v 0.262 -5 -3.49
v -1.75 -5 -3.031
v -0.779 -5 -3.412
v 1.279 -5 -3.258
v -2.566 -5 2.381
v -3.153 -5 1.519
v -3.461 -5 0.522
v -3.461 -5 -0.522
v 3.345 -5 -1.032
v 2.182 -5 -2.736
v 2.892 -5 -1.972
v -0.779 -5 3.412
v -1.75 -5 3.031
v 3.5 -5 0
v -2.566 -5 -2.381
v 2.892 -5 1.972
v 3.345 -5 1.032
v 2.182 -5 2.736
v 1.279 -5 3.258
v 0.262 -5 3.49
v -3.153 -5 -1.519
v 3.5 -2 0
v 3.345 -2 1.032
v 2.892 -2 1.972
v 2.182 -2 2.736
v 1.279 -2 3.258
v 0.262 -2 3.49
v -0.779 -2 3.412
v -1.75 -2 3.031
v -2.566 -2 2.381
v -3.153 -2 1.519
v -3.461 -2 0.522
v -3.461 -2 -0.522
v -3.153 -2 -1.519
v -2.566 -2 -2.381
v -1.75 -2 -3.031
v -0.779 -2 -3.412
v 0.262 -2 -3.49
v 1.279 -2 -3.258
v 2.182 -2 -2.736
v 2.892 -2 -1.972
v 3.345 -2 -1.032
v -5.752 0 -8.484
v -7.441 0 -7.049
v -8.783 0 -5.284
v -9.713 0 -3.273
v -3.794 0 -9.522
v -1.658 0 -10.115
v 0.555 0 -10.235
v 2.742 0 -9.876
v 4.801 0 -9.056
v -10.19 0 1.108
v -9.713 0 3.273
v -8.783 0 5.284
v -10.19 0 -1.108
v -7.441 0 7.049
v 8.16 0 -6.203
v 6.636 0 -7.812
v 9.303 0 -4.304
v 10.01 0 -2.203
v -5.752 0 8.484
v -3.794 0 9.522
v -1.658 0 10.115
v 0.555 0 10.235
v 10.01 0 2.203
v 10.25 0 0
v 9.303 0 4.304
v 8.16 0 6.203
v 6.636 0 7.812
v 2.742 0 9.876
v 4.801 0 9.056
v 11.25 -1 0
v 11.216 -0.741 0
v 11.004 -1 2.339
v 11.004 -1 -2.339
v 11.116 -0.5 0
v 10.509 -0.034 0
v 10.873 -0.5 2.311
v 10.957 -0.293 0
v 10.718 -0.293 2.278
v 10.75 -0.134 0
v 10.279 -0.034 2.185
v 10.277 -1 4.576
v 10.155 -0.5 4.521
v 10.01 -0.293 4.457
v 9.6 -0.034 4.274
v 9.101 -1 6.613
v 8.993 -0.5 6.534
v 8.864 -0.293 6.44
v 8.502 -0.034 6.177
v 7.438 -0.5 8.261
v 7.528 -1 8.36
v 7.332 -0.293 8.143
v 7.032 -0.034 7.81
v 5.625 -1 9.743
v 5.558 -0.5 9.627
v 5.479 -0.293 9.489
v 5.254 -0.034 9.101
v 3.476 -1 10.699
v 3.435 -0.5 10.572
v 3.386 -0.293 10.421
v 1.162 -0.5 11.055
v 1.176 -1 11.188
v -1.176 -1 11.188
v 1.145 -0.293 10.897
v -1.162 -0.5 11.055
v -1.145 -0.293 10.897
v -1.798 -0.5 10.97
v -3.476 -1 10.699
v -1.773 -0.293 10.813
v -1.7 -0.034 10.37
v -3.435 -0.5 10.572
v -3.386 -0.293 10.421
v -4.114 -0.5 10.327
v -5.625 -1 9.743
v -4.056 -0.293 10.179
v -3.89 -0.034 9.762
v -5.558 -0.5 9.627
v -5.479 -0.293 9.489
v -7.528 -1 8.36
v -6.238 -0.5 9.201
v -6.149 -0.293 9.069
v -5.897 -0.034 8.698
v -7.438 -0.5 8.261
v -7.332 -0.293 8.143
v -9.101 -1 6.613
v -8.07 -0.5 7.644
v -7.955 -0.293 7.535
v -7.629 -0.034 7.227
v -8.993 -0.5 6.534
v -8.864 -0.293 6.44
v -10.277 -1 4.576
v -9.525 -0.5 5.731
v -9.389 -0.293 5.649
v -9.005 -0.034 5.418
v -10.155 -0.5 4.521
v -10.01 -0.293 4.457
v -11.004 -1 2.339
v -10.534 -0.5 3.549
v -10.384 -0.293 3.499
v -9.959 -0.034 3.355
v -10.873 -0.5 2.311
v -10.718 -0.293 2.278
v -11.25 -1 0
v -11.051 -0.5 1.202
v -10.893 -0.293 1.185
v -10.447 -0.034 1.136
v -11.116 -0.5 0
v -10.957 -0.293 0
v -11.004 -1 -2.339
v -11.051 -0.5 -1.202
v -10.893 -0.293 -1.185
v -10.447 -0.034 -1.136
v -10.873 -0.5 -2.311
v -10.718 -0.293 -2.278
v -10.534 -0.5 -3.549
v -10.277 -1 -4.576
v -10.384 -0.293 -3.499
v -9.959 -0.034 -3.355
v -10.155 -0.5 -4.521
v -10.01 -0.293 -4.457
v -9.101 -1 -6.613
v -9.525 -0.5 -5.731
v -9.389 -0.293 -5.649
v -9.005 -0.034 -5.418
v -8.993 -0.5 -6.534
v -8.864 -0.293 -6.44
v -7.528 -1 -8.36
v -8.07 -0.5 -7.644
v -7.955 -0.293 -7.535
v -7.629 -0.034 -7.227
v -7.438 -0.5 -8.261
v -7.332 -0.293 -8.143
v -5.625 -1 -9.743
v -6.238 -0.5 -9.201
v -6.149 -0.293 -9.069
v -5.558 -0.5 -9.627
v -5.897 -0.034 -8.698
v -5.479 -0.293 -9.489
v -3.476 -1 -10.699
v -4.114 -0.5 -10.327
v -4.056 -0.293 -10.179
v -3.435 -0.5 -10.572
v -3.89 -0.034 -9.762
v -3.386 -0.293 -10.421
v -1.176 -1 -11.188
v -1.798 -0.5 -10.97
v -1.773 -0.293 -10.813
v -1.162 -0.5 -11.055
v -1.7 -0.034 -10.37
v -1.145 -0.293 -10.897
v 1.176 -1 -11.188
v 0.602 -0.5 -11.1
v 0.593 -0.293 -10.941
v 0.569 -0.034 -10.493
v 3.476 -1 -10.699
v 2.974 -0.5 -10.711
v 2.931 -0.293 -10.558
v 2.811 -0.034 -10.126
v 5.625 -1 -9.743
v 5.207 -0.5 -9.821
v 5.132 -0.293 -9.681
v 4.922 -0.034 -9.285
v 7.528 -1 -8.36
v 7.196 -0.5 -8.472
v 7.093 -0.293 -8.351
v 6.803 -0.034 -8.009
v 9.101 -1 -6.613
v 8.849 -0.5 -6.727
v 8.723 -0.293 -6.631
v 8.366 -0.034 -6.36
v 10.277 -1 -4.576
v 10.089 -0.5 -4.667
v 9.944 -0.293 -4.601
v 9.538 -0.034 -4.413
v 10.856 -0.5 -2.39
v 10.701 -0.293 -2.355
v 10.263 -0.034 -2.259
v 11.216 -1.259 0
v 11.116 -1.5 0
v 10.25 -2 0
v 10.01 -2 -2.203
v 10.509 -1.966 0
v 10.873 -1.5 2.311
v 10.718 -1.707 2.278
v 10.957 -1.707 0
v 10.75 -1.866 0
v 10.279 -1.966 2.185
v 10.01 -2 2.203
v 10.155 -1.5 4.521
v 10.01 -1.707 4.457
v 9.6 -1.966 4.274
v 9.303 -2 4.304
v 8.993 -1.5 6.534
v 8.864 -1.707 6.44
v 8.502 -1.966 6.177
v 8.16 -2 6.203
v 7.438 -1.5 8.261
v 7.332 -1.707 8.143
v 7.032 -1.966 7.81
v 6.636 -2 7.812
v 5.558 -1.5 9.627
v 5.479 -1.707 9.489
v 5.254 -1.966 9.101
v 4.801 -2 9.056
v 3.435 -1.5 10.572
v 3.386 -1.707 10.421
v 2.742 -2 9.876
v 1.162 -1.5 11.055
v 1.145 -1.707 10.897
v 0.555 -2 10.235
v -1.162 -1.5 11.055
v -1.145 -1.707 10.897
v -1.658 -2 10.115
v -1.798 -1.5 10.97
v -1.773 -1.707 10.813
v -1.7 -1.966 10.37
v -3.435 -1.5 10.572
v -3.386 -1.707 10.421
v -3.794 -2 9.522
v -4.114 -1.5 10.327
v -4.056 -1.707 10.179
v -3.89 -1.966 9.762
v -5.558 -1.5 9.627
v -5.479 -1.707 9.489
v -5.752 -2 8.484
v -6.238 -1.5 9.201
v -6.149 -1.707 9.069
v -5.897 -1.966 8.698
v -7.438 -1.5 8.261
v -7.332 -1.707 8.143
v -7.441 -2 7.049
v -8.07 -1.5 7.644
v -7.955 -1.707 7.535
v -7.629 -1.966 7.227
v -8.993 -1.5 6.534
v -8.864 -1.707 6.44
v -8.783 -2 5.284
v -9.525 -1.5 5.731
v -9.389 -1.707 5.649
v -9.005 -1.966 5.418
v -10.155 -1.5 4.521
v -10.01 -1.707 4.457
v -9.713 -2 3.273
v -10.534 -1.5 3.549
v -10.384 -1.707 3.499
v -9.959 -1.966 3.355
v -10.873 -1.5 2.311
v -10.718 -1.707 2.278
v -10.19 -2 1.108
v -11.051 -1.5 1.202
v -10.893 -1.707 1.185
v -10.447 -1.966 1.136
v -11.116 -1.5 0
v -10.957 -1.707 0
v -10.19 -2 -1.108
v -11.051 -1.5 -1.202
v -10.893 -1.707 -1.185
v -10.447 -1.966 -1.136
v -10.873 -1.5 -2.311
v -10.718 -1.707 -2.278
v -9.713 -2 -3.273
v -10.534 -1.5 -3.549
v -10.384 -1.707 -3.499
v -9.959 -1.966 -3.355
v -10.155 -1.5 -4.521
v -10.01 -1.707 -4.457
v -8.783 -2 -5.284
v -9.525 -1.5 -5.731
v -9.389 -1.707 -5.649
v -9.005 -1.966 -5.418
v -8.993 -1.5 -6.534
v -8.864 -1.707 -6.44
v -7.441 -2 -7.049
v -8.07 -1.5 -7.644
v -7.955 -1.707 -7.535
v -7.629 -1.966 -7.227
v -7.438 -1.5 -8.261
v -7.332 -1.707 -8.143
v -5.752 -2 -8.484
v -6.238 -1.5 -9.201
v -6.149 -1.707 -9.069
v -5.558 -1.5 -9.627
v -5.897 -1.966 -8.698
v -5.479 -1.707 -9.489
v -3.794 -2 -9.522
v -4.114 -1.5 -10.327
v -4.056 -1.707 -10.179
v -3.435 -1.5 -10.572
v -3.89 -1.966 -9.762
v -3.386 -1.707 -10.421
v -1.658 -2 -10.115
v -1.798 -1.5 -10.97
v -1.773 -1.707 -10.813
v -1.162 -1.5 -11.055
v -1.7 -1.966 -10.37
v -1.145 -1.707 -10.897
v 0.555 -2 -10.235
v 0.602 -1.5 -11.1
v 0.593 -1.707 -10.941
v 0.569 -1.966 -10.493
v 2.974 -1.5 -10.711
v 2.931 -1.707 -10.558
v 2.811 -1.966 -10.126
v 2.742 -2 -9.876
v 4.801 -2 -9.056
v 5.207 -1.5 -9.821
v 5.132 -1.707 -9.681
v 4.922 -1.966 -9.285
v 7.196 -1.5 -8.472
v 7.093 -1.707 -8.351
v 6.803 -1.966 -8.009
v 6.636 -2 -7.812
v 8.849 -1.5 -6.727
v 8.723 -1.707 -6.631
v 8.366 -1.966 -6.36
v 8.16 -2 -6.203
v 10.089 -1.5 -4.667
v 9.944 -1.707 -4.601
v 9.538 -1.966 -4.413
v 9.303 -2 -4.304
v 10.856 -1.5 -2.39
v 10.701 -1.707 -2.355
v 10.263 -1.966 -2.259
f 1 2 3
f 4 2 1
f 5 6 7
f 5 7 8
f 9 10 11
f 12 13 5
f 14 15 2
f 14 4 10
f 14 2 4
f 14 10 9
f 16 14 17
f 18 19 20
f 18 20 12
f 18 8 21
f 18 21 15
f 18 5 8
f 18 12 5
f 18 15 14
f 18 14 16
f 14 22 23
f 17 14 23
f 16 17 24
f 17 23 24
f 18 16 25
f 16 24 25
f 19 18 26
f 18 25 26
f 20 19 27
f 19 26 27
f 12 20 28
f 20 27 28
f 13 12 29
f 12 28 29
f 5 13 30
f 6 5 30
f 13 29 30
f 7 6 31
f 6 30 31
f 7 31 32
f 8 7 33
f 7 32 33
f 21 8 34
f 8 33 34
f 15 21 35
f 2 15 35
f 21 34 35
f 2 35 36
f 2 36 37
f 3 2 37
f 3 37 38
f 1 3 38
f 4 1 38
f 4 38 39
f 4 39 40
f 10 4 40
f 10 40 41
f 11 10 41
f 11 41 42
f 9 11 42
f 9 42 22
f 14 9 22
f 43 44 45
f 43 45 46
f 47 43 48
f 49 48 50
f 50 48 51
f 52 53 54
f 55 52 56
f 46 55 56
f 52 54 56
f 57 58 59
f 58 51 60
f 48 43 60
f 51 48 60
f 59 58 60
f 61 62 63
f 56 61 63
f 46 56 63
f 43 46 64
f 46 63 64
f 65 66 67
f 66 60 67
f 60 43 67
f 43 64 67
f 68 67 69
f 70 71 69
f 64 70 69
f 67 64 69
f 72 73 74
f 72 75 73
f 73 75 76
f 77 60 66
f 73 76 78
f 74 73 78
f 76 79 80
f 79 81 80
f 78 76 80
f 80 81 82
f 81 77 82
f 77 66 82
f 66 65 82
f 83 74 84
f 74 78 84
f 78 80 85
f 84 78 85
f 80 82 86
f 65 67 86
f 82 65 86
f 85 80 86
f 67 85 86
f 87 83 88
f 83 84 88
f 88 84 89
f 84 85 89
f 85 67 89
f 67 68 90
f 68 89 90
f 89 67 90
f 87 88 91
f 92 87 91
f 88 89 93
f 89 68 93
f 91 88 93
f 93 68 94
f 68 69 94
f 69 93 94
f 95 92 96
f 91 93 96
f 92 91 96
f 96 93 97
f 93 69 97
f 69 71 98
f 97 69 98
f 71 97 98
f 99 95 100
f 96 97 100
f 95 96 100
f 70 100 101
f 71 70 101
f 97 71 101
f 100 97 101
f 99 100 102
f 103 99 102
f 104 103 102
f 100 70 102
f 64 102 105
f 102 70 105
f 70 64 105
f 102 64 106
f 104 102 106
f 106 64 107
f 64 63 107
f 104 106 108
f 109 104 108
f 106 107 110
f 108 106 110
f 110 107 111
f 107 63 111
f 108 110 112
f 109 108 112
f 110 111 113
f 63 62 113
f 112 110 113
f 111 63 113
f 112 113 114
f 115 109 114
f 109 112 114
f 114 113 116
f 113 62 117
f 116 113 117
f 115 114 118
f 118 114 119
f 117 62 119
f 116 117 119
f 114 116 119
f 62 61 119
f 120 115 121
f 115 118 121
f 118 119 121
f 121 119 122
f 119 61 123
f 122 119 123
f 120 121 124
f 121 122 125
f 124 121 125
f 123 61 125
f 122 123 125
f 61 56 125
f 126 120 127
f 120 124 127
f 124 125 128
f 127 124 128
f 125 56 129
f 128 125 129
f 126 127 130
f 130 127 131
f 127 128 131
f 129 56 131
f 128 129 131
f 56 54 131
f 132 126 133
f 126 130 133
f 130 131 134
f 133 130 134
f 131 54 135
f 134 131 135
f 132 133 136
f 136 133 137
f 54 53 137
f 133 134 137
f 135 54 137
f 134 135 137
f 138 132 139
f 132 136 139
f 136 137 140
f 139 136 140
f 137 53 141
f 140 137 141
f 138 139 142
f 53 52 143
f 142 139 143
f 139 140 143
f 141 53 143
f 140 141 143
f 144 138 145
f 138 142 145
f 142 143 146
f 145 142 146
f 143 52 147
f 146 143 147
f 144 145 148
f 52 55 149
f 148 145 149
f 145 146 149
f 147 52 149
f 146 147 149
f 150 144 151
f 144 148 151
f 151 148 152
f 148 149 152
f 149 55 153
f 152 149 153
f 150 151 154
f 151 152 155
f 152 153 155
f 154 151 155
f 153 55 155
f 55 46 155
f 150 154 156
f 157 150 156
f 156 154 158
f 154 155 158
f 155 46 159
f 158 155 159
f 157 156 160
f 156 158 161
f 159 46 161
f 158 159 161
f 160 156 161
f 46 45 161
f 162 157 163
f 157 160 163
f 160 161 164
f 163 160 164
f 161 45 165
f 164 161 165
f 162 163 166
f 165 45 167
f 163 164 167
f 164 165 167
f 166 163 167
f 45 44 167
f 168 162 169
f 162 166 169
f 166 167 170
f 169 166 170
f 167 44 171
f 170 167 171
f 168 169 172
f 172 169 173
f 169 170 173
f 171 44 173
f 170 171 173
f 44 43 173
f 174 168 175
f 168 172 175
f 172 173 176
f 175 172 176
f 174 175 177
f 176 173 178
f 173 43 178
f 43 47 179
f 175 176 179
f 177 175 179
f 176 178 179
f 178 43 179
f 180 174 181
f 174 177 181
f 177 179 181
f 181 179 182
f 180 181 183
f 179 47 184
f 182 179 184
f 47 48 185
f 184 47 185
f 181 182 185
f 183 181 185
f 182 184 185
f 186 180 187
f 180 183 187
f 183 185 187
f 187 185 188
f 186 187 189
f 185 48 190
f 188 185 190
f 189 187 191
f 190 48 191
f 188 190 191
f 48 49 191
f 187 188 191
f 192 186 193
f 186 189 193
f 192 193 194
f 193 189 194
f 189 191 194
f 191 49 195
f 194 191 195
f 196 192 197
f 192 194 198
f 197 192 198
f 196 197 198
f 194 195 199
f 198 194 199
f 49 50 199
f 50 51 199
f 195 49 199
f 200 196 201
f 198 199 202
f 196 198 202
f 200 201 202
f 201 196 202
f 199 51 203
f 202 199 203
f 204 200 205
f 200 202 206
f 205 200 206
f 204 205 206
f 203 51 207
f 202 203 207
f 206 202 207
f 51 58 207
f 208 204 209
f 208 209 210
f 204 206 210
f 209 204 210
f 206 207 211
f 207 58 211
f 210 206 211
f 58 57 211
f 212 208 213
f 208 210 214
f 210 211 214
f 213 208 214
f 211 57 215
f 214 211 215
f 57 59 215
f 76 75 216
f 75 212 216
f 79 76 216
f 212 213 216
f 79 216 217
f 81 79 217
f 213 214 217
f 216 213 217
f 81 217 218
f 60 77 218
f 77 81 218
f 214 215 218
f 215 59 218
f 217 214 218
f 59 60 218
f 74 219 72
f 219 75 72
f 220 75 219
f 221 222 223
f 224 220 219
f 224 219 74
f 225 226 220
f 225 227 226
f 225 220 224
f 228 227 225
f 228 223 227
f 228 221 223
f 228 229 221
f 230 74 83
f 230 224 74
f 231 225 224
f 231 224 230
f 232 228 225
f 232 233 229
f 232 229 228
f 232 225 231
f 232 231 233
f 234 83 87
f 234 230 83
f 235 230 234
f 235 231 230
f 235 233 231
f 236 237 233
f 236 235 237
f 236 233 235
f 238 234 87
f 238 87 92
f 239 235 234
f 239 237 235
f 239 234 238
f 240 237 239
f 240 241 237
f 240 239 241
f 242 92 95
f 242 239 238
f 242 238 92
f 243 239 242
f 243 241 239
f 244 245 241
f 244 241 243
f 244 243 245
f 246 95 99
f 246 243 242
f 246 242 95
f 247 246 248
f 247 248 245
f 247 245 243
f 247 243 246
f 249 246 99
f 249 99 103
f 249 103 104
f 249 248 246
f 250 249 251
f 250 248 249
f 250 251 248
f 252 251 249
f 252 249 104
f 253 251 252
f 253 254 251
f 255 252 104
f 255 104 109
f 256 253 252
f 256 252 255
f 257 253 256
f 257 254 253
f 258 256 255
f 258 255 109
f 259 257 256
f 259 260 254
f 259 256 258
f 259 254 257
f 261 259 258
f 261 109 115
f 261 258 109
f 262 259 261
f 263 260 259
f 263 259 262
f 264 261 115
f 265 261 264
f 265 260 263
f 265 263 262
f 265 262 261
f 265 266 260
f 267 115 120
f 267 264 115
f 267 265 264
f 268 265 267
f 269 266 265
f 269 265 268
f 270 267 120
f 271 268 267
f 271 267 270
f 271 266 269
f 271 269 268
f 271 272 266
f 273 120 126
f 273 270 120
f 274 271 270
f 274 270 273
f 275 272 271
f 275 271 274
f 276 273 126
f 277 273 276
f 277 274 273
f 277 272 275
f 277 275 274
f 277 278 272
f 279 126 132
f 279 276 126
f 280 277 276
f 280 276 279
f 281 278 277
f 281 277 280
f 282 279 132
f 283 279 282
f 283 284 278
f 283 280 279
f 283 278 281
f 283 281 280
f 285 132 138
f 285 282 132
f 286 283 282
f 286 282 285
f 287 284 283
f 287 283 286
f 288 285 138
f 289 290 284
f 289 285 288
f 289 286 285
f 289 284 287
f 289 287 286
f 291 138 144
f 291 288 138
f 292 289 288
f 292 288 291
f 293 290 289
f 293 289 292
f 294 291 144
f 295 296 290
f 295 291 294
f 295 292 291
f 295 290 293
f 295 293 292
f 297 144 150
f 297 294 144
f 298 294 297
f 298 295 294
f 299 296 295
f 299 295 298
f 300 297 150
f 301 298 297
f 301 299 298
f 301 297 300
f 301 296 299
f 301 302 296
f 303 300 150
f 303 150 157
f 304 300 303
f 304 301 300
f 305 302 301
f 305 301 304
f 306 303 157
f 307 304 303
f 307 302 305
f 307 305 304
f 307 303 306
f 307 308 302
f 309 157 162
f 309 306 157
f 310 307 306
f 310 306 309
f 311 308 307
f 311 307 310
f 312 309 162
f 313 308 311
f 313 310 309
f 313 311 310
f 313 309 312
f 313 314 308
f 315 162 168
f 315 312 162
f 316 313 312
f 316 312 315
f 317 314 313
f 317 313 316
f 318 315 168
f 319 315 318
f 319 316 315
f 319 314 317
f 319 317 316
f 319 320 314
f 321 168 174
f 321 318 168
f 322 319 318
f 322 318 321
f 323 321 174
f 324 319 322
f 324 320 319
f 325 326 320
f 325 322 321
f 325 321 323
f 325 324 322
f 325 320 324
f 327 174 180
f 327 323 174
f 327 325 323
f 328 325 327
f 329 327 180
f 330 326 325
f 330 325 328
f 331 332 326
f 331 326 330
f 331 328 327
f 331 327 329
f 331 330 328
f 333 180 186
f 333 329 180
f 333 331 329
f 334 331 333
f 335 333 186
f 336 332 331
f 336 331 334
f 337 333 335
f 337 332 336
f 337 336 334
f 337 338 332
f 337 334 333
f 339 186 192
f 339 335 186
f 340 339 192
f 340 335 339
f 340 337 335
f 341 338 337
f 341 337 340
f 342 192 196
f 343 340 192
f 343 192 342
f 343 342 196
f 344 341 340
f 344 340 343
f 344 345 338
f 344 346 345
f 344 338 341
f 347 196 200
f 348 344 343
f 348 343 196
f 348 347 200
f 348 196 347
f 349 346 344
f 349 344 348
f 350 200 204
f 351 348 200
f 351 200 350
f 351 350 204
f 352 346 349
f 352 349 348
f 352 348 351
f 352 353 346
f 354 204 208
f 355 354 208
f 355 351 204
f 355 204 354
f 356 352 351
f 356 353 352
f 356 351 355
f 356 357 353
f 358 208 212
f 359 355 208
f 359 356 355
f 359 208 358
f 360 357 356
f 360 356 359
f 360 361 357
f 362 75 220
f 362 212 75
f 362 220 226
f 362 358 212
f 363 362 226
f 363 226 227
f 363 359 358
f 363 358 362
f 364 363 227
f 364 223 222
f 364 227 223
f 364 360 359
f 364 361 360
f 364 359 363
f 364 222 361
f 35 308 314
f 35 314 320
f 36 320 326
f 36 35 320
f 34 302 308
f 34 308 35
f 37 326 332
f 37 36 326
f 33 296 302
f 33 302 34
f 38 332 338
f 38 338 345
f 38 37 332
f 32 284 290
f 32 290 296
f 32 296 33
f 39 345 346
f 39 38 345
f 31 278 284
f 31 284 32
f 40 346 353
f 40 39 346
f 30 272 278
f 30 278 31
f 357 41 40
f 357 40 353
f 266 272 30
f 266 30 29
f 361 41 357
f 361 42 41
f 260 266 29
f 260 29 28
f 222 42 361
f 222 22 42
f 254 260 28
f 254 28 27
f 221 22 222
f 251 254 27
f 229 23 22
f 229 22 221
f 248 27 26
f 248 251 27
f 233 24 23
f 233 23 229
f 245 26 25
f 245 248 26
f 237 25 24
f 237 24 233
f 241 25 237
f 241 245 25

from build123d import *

# Parameters (mm, degrees)
F0_R     = 3.5
F1_DEPTH = 5
F0_R_2   = 11.25
F2_DEPTH = 2
F3_R     = 0.99999


# Not quite as in the source:
# - a fillet or chamfer is up to 0.001 mm smaller than in the source, because OpenCascade refuses the exact size


with BuildPart() as f1:
    # F0 (on Front) → F1 (new body)
    with BuildSketch(Plane.XZ):
        Circle(F0_R)
    extrude(amount=F1_DEPTH)

    # F0 (on Front) → F2 (join)
    with BuildSketch(Plane.XZ):
        Circle(F0_R_2)
        Circle(F0_R, mode=Mode.SUBTRACT)
    extrude(amount=F2_DEPTH)

    # F3 (radius 1 in the source; OpenCascade refuses exactly that, so slightly less here)
    f3_edges = [f1.edges().sort_by_distance(p)[0] for p in [
        (-11.25, -2, 0),
        (-11.25, 0, 0),
    ]]
    fillet(f3_edges, radius=F3_R)


solid = f1.part
